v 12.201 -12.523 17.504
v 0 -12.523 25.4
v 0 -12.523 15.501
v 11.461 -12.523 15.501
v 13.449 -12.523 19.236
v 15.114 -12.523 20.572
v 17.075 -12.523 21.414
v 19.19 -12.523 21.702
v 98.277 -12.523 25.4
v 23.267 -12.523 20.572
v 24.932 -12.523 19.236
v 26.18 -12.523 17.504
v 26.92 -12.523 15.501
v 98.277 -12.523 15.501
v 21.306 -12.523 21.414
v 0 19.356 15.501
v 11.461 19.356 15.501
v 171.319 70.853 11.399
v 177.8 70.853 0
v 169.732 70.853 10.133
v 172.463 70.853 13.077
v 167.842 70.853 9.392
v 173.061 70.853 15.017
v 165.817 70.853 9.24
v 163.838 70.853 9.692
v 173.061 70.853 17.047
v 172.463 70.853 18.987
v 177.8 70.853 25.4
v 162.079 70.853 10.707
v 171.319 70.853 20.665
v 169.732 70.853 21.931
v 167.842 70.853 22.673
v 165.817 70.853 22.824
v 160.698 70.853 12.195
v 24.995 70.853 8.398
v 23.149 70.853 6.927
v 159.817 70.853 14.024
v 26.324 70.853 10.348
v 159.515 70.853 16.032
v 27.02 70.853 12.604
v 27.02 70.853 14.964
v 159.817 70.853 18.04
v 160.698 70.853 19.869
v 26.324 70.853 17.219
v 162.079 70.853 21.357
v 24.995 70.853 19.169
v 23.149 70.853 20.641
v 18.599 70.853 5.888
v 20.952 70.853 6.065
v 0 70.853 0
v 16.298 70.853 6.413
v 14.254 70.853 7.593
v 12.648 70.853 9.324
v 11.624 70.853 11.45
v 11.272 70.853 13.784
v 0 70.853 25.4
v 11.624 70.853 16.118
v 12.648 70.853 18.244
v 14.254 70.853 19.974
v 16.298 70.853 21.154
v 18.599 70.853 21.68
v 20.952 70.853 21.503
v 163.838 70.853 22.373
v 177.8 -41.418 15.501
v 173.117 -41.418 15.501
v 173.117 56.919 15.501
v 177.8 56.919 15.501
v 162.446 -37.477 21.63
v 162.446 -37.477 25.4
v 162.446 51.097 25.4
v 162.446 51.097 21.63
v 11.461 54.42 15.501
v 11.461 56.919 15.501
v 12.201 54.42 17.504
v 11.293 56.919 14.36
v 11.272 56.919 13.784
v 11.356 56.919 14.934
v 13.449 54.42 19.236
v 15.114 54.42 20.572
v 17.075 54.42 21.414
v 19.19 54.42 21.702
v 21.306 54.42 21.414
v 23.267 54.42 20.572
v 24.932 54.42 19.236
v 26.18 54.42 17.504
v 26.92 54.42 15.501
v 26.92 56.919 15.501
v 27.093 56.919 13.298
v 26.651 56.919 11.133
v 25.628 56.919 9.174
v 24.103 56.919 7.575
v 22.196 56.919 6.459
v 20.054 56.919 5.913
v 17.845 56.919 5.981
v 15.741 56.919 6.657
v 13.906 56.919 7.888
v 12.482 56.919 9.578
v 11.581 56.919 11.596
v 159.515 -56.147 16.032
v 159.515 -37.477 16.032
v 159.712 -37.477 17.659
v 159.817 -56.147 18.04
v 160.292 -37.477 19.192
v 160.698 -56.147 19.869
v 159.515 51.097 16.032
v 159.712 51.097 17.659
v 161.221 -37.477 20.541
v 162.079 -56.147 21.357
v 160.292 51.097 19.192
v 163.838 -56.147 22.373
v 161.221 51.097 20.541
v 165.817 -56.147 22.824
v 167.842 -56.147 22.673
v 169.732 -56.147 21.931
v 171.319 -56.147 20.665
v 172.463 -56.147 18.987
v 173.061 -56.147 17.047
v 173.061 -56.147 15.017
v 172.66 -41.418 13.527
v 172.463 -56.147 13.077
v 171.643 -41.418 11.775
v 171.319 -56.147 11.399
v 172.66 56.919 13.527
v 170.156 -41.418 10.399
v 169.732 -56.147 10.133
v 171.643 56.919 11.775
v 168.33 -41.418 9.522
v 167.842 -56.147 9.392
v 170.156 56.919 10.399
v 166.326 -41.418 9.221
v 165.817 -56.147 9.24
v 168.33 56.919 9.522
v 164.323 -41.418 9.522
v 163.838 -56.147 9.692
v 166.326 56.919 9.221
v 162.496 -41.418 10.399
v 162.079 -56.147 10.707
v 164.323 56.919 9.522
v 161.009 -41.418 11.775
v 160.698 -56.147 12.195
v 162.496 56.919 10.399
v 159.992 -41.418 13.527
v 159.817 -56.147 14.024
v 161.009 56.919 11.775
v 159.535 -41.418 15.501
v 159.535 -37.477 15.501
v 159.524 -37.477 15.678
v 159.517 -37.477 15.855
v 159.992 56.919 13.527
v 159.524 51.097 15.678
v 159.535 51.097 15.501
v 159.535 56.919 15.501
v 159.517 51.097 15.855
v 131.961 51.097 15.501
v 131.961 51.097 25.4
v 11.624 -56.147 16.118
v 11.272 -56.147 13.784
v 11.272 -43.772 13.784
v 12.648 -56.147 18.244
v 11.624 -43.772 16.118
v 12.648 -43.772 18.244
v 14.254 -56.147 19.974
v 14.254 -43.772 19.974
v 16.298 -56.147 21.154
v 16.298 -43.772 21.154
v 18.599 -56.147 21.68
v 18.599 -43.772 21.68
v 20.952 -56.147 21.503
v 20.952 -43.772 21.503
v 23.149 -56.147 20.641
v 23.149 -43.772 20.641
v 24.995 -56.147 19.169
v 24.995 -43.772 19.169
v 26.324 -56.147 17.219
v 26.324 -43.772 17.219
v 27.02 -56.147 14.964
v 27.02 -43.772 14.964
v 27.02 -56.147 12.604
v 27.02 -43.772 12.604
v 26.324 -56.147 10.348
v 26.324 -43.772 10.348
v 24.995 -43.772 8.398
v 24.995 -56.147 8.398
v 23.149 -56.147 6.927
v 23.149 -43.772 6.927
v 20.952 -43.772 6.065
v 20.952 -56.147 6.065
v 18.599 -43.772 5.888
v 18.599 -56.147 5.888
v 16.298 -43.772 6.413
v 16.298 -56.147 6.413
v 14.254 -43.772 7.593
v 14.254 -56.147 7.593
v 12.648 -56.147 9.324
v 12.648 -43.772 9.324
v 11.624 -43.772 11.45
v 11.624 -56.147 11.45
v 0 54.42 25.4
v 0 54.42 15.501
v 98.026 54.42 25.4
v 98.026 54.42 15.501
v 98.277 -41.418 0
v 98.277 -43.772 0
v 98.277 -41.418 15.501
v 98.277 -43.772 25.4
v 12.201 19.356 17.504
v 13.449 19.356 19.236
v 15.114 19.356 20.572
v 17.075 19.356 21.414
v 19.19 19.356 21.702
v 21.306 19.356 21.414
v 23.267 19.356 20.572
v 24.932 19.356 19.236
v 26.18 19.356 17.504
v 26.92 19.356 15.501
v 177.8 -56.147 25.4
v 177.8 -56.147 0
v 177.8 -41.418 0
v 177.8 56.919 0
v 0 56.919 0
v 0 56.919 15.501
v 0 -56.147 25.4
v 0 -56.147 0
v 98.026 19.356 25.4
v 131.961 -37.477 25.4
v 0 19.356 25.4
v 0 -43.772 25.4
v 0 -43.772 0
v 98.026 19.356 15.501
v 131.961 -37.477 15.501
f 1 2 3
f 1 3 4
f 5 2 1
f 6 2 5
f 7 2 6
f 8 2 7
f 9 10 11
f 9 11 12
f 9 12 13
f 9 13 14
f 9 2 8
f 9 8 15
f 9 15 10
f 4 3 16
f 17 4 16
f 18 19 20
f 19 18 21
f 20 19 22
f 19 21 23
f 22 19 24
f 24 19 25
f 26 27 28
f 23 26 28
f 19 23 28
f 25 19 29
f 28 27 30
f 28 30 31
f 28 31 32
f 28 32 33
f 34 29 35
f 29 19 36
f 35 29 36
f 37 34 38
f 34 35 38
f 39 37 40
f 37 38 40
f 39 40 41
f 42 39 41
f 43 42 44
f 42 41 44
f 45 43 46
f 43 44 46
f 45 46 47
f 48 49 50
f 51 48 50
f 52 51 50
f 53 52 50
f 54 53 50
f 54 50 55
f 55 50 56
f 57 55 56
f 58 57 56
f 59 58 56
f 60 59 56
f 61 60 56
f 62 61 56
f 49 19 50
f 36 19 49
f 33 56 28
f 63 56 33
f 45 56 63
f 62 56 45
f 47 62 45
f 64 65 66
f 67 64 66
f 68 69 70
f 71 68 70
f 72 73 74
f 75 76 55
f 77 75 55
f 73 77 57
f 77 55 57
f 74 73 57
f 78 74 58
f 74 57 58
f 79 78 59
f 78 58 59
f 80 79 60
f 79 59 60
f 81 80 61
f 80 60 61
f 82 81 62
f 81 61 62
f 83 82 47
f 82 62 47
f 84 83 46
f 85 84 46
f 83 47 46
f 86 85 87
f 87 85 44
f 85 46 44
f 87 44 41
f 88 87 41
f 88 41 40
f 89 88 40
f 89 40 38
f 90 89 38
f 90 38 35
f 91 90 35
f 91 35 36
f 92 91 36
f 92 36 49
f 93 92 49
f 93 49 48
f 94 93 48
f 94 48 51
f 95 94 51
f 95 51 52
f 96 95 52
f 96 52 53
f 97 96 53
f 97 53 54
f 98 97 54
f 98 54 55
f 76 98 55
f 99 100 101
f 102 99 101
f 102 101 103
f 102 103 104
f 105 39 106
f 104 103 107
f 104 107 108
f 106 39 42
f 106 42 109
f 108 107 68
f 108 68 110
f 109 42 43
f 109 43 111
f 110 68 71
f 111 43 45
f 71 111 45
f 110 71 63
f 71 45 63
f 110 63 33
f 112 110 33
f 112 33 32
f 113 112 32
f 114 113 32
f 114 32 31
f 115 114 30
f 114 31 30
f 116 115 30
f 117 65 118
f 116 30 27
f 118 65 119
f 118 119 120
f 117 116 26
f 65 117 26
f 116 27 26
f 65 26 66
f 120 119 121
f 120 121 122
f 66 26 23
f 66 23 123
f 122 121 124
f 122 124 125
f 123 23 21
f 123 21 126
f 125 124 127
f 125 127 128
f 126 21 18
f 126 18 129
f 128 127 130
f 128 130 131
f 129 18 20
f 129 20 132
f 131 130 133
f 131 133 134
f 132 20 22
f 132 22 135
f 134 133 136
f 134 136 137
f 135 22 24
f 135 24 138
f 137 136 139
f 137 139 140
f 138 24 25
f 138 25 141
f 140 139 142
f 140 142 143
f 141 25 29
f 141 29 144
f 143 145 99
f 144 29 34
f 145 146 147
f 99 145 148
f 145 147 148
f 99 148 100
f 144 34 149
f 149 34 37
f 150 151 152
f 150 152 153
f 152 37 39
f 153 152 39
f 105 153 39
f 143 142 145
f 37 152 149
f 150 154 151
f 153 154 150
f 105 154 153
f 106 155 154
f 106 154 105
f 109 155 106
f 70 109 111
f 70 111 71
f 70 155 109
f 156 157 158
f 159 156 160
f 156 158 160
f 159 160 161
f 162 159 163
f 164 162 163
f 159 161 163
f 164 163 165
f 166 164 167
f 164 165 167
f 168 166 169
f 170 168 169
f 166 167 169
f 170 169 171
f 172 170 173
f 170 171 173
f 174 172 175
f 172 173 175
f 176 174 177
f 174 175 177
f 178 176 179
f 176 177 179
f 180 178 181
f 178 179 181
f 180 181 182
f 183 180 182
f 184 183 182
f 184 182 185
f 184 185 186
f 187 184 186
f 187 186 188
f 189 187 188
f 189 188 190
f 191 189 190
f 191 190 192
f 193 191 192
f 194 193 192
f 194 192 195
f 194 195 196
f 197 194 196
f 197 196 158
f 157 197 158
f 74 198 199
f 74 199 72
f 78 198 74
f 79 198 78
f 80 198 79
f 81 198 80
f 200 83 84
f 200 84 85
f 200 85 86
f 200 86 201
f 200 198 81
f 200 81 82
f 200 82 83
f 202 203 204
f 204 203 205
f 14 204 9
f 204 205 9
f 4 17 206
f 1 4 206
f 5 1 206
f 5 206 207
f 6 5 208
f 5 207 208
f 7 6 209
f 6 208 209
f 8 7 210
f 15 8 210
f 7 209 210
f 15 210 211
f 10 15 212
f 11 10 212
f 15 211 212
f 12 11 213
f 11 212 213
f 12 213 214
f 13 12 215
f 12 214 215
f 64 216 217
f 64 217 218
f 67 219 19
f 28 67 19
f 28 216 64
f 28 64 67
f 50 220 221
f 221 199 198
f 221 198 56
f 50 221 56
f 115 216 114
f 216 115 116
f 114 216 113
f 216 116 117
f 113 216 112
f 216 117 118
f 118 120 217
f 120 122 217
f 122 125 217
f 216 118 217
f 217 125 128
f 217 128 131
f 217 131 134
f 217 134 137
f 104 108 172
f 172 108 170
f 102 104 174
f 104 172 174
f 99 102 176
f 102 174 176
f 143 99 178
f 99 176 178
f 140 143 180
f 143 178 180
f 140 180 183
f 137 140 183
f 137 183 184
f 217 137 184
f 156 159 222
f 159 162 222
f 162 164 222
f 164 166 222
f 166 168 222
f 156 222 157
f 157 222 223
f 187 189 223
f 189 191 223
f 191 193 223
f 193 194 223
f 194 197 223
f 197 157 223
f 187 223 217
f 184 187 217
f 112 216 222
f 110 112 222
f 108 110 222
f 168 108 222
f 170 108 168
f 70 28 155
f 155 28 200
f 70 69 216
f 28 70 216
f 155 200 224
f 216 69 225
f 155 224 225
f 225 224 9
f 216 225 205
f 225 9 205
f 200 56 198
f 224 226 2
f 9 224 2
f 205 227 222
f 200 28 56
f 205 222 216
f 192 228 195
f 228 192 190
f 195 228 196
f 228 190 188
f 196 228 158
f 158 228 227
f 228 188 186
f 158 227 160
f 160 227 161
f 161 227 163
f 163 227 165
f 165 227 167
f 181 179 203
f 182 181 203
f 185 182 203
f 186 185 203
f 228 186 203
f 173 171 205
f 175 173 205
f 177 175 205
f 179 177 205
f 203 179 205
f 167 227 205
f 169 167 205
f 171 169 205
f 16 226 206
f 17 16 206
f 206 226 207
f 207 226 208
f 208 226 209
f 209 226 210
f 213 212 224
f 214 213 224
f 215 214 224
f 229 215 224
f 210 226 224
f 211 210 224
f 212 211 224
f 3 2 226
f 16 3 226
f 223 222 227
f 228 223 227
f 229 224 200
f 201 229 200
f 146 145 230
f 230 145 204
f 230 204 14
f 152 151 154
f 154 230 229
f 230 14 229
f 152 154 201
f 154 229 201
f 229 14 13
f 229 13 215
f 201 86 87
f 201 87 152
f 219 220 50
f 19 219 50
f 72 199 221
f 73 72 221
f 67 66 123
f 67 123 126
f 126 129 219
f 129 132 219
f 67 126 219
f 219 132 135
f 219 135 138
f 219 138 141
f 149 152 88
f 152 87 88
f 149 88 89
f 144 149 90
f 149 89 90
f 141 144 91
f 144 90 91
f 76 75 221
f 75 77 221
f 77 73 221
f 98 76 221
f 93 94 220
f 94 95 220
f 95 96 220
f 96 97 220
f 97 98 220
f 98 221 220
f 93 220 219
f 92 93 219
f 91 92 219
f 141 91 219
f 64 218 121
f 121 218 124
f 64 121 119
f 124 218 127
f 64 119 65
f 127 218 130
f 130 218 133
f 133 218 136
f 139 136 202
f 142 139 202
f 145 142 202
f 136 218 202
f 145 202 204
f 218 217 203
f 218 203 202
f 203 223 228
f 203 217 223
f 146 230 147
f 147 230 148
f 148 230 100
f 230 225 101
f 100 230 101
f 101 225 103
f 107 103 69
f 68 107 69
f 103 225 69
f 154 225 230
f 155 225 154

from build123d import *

# Parameters (mm, degrees)
F0_W      = 127
F0_H      = 25.4
F1_DEPTH  = 152.4
F2_W      = 98.3371436596
F2_H      = 15.5014246702
F3_DEPTH  = 152.401
F5_DEPTH  = 25.4
F6_R      = 6.8113689933
F7_DEPTH  = 127.001
F10_R     = 7.917856488
F11_DEPTH = 127.001
F12_W     = 98.2769206166
F12_H     = 31.2483850867
F13_DEPTH = 25.401
F14_W     = 98.0260297656
F14_H     = 35.063225776
F15_DEPTH = 25.401
F16_W     = 30.4847359657
F16_H     = 88.5739065707
F17_DEPTH = 25.401


with BuildPart() as f1:
    # F0 (on Right) → F1 (new body)
    with BuildSketch(Plane.YZ):
        with Locations((7.3526296653, 12.7)):
            Rectangle(F0_W, F0_H)
    extrude(amount=F1_DEPTH)

    # F2 (on face) → F3 (cut, through all)
    with BuildSketch(Plane.YZ.offset(152.4)):
        with Locations((7.7507048845, 7.7507123351)):
            Rectangle(F2_W, F2_H)
    extrude(amount=-F3_DEPTH, mode=Mode.SUBTRACT)

    # F4 (on face) → F5 (join)
    with BuildSketch(Plane.YZ.offset(152.4)):
        Polygon((70.8526296653, 25.4), (-56.1473703347, 25.4), (-56.1473703347, 0), (-41.4178669453, 0), (-41.4178669453, 15.5014246702), (56.9192767143, 15.5014246702), (56.9192767143, 0), (70.8526296653, 0), align=None)
    extrude(amount=F5_DEPTH)

    # F6 (on face) → F7 (cut, through all)
    with BuildSketch(Plane(origin=(0, 70.8526296653, 0), x_dir=(-1, 0, 0), z_dir=(0, 1, 0))):
        with Locations((-166.326135397, 16.0321518779)):
            Circle(F6_R)
    extrude(amount=-F7_DEPTH, mode=Mode.SUBTRACT)

    # F10 (on face) → F11 (cut, through all)
    with BuildSketch(Plane(origin=(0, 70.8526296653, 0), x_dir=(-1, 0, 0), z_dir=(0, 1, 0))):
        with Locations((-19.1903246846, 13.7839203013)):
            Circle(F10_R)
    extrude(amount=-F11_DEPTH, mode=Mode.SUBTRACT)

    # F12 (on face) → F13 (cut, through all)
    with BuildSketch(Plane.XY.offset(25.4)):
        with Locations((49.1384603083, -28.1473351642)):
            Rectangle(F12_W, F12_H)
    extrude(amount=-F13_DEPTH, mode=Mode.SUBTRACT)

    # F14 (on face) → F15 (cut, through all)
    with BuildSketch(Plane.XY.offset(25.4)):
        with Locations((49.0130148828, 36.8879642338)):
            Rectangle(F14_W, F14_H)
    extrude(amount=-F15_DEPTH, mode=Mode.SUBTRACT)

    # F16 (on face) → F17 (cut, through all)
    with BuildSketch(Plane.XY.offset(25.4)):
        with Locations((147.2032368183, 6.8099442869)):
            Rectangle(F16_W, F16_H)
    extrude(amount=-F17_DEPTH, mode=Mode.SUBTRACT)


solid = f1.part
